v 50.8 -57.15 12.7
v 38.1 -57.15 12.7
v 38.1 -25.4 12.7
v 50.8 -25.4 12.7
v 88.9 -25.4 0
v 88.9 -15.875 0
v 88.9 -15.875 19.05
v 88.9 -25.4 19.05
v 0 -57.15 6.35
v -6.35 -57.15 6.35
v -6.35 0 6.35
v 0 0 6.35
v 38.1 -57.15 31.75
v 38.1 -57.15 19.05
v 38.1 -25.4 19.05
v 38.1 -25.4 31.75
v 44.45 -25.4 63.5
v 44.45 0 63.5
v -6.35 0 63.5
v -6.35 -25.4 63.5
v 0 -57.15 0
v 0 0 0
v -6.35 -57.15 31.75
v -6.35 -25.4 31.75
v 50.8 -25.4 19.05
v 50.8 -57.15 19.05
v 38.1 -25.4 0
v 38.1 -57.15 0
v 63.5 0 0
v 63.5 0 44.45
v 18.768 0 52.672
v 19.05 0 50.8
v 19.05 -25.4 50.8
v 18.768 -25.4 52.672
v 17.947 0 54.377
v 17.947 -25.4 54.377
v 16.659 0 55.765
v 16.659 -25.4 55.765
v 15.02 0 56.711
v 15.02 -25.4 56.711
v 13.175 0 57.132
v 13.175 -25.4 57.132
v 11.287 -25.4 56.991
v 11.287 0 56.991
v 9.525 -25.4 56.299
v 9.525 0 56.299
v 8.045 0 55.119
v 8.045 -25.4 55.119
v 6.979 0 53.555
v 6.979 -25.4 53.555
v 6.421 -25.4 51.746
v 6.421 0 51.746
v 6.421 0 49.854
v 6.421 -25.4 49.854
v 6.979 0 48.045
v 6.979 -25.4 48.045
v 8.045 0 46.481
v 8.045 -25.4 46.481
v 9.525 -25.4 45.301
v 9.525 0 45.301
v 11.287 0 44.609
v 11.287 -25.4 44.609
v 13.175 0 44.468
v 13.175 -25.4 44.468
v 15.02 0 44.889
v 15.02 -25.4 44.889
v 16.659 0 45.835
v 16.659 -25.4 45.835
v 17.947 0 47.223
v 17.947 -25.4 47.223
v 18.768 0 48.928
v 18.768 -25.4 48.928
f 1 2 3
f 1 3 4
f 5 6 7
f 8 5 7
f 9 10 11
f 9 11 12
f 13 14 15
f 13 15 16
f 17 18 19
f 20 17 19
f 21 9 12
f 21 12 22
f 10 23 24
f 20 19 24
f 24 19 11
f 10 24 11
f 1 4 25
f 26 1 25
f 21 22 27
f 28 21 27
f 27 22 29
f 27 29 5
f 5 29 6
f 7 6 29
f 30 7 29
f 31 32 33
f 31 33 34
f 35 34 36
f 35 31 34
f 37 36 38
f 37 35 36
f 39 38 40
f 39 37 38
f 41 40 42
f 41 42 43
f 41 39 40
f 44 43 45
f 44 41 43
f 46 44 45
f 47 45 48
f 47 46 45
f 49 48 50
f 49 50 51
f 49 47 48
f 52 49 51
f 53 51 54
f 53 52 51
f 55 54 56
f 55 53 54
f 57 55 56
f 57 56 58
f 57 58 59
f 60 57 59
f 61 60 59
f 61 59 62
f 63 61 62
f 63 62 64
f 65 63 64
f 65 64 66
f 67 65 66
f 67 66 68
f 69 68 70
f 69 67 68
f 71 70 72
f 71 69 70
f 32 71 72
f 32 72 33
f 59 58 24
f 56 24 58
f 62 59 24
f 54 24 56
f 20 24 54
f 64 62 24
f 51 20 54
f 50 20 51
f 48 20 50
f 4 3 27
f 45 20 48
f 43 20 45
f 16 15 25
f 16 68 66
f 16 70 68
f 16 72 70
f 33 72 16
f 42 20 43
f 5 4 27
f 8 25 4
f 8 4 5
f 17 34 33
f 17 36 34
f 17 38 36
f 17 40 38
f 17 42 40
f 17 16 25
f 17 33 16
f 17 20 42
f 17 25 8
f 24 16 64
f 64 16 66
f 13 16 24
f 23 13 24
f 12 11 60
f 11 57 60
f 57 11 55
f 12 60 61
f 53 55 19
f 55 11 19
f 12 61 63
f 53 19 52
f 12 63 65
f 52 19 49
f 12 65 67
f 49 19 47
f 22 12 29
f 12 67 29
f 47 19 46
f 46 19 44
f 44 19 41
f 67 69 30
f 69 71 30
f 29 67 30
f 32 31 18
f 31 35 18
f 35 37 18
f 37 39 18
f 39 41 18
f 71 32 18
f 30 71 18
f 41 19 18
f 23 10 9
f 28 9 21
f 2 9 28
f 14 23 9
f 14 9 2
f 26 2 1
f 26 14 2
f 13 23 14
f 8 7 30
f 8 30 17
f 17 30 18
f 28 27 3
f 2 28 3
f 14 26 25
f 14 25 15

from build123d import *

# Parameters (mm, degrees)
F0_R     = 6.35
F1_DEPTH = 25.4
F2_DEPTH = 57.15
F4_DEPTH = 50.8


with BuildPart() as f1:
    # F0 (on Front) → F1 (new body)
    with BuildSketch(Plane.XZ):
        Polygon((38.1, 12.7), (38.1, 0), (88.9, 0), (88.9, 19.05), (44.45, 63.5), (-6.35, 63.5), (-6.35, 31.75), (38.1, 31.75), (38.1, 19.05), (50.8, 19.05), (50.8, 12.7), align=None)
        with Locations((12.7, 50.8)):
            Circle(F0_R, mode=Mode.SUBTRACT)
    extrude(amount=F1_DEPTH)

    # F0 (on Front) → F2 (join)
    with BuildSketch(Plane.XZ):
        Polygon((0, 6.35), (0, 0), (38.1, 0), (38.1, 12.7), (50.8, 12.7), (50.8, 19.05), (38.1, 19.05), (38.1, 31.75), (-6.35, 31.75), (-6.35, 6.35), align=None)
    extrude(amount=F2_DEPTH)

    # F3 (on face) → F4 (cut)
    with BuildSketch(Plane(origin=(0, 0, 0), x_dir=(1, 0, 0), z_dir=(0, 0, -1))):
        Polygon((88.9, 0), (88.9, 15.875), (63.5, 0), align=None)
    extrude(amount=-F4_DEPTH, mode=Mode.SUBTRACT)


solid = f1.part
